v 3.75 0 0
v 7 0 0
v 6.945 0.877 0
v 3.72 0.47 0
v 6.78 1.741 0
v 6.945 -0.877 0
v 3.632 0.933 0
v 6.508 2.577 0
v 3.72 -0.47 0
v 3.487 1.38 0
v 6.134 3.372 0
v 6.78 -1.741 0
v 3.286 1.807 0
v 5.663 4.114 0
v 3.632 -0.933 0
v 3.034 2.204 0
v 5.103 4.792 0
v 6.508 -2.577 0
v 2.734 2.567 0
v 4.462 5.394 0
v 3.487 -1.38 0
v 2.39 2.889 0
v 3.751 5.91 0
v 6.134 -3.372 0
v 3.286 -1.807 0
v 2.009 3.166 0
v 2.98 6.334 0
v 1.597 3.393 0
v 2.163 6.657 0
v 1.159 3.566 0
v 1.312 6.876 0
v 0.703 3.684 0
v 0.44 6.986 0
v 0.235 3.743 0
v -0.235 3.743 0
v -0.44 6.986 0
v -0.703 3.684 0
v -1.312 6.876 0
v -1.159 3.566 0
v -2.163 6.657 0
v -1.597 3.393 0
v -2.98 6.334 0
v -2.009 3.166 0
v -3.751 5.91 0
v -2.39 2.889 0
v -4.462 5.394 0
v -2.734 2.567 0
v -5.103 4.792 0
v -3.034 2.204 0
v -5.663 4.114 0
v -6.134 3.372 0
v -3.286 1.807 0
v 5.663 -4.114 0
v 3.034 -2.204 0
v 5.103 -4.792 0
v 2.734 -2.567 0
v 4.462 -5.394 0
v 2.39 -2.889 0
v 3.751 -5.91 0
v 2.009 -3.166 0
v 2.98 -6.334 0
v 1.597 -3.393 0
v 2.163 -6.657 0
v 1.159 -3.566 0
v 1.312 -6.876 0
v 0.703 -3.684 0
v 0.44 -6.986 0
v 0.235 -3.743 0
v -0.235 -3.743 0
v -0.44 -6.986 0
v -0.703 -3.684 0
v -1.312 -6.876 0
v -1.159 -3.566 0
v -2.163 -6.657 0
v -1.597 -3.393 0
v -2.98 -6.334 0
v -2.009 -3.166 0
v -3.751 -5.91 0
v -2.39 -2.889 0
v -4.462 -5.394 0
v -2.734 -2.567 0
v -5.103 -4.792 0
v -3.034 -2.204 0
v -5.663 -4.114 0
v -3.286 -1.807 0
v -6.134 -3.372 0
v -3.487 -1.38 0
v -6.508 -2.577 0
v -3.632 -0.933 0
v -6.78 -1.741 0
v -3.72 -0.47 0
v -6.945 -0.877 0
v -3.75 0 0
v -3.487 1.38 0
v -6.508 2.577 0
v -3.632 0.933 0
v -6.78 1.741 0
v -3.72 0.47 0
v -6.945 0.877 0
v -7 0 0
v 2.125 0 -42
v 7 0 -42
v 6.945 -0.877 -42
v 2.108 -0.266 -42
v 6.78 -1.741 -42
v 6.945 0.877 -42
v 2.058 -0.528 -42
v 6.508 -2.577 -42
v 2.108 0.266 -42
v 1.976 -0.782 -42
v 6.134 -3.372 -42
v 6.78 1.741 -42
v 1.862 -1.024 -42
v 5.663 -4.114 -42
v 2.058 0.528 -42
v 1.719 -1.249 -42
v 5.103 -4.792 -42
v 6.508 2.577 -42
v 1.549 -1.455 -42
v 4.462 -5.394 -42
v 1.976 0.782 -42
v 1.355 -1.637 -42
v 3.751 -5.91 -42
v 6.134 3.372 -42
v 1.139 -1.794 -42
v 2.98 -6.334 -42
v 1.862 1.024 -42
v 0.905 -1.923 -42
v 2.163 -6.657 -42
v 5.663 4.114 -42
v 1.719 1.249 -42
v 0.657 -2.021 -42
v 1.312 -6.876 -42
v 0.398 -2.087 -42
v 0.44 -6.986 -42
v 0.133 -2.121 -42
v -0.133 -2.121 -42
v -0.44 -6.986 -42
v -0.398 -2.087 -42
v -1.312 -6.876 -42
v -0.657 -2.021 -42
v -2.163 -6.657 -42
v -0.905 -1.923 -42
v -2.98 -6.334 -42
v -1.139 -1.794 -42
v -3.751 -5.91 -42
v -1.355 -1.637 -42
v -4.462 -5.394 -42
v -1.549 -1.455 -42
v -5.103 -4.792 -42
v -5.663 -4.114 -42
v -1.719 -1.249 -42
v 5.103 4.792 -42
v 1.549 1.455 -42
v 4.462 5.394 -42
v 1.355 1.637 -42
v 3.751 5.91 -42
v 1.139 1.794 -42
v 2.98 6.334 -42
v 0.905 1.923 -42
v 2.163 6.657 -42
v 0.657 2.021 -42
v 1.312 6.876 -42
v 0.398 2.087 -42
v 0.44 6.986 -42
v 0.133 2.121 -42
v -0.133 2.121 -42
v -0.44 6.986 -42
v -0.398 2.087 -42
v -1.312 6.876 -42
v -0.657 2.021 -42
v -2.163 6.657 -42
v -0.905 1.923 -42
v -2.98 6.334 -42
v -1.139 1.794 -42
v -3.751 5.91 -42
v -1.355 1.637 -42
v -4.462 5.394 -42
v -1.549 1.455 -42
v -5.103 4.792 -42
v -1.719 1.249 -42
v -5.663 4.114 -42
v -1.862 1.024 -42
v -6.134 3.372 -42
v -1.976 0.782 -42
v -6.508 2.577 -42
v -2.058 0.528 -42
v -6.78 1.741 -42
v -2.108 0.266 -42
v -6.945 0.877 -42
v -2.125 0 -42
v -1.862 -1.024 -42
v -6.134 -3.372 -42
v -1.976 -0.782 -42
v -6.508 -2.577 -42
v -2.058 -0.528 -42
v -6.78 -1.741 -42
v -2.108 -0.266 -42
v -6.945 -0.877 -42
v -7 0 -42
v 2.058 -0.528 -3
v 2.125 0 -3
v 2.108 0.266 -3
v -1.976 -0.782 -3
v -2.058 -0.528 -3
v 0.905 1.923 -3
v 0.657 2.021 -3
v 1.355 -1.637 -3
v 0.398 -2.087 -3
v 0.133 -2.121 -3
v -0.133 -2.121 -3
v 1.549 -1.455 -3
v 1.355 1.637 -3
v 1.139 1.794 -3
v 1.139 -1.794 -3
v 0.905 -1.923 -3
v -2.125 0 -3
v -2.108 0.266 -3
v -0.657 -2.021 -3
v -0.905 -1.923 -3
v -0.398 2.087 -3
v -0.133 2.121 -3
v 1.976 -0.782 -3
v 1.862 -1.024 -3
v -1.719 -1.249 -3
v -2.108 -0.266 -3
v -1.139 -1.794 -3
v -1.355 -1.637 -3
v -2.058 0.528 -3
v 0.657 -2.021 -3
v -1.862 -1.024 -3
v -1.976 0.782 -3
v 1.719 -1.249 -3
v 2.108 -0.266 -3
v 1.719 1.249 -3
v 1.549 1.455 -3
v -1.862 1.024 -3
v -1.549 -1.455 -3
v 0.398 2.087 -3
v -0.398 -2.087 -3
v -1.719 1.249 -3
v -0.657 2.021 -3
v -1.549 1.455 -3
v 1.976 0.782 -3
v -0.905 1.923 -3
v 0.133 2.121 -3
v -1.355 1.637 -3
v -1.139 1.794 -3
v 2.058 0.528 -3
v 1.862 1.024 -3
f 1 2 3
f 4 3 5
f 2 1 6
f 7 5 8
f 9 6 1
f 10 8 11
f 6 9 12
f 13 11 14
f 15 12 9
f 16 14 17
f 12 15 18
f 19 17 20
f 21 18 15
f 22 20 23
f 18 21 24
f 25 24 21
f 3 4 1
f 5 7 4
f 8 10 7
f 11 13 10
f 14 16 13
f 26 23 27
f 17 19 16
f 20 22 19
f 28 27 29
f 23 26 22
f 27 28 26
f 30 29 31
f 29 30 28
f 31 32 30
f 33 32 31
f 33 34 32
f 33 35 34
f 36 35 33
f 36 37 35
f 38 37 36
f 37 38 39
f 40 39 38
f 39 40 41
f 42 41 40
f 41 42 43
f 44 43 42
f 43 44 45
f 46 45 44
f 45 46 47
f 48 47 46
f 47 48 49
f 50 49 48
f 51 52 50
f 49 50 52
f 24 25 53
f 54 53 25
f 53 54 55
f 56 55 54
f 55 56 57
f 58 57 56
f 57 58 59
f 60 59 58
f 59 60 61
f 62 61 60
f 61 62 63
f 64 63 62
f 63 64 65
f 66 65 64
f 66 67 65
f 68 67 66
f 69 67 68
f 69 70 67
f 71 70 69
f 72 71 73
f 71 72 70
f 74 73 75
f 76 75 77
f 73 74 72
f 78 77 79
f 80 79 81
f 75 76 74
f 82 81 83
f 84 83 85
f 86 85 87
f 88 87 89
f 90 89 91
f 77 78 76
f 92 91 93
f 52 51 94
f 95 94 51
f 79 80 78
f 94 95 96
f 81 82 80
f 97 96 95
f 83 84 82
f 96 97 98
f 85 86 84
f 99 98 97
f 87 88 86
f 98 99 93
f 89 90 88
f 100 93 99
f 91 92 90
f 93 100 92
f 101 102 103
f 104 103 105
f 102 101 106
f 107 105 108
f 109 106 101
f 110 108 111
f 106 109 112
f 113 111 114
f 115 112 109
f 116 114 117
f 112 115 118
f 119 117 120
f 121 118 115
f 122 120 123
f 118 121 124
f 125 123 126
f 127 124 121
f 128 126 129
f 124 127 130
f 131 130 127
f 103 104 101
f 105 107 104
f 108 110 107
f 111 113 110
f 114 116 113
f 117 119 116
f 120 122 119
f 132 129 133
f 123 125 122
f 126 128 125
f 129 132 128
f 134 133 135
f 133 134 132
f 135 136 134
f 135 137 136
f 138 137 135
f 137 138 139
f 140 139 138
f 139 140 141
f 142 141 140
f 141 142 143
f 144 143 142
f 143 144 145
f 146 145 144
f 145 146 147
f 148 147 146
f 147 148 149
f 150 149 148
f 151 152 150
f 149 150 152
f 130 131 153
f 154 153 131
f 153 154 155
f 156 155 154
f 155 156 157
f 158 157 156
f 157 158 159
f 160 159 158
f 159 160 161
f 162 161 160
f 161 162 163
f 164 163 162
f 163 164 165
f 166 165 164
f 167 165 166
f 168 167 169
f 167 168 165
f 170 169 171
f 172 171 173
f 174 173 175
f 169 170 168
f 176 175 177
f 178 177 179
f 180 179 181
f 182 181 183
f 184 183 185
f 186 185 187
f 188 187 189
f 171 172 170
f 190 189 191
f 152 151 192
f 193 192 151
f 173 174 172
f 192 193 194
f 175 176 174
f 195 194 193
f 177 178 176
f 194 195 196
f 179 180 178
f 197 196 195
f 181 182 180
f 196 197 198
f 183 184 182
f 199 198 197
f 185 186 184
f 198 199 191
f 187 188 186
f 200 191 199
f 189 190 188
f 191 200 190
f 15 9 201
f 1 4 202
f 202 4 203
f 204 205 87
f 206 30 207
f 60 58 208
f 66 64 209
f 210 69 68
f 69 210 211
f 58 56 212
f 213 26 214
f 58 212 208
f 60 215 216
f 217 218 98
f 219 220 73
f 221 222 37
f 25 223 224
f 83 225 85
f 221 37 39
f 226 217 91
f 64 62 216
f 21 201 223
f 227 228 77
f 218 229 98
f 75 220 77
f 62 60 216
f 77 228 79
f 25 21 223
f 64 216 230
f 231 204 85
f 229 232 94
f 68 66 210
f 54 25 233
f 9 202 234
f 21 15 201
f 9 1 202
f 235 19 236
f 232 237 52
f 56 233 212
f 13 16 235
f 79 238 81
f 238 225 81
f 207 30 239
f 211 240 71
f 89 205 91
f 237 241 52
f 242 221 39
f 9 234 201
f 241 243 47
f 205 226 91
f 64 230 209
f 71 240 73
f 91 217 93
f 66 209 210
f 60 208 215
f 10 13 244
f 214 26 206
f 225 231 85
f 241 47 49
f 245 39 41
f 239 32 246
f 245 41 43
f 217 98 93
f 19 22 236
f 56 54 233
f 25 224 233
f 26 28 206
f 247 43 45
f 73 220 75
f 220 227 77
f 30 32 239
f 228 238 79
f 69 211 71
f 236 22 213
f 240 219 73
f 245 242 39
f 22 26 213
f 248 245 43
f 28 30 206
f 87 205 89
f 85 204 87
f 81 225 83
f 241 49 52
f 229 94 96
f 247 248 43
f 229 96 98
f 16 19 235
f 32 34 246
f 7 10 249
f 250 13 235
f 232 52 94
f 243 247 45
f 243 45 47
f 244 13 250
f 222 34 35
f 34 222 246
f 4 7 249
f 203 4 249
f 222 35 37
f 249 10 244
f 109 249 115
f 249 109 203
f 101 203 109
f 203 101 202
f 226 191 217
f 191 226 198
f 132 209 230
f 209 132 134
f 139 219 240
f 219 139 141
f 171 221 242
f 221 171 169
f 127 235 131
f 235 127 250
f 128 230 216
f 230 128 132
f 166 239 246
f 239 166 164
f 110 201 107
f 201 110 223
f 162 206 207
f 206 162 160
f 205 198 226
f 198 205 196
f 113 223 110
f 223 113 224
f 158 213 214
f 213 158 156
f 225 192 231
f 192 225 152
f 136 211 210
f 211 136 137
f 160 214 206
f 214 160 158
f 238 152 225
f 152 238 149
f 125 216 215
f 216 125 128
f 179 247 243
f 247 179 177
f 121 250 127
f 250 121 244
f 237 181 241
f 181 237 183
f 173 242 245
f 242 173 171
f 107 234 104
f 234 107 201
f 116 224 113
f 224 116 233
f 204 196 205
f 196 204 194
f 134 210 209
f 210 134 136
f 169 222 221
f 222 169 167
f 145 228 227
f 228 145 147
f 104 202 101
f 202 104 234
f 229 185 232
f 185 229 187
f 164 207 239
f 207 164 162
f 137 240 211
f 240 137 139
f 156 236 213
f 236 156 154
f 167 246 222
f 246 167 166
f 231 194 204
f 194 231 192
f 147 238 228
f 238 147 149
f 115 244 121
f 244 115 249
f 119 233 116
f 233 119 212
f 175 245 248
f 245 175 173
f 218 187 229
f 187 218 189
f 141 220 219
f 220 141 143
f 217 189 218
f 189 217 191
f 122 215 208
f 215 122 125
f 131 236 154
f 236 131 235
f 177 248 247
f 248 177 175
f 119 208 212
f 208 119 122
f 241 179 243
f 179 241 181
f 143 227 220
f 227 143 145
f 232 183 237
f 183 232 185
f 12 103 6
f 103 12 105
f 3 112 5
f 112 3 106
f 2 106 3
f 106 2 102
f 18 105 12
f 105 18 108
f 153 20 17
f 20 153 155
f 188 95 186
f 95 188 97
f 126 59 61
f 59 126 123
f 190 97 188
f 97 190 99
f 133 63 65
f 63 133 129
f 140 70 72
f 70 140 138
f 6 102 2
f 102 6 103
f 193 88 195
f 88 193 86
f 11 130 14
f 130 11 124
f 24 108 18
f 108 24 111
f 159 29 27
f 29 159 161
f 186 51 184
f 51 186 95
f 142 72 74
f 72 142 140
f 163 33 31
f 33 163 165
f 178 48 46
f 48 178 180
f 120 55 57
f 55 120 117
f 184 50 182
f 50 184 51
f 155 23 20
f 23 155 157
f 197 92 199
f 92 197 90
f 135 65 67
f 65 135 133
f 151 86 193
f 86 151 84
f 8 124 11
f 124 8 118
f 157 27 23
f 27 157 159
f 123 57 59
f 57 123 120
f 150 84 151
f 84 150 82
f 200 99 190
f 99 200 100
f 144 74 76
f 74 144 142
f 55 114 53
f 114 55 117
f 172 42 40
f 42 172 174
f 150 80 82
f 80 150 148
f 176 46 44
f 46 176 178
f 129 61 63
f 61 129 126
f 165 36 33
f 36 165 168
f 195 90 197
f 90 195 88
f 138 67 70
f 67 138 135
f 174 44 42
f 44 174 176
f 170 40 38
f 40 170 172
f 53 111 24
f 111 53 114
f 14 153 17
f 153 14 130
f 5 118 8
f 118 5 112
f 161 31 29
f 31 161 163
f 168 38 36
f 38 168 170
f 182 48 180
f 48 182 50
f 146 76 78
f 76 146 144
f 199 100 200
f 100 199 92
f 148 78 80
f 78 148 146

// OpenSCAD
$fn = 50;


difference() {
	union() {
		translate(v = [0, 0, -42.0000000000]) {
			cylinder(h = 42, r = 7.0000000000);
		}
	}
	union() {
		translate(v = [0, 0, 0]) {
			rotate(a = [0, 0, 0]) {
				difference() {
					union() {
						#translate(v = [0, 0, -42.0000000000]) {
							cylinder(h = 42, r = 2.0000000000);
						}
						#translate(v = [0, 0, -3]) {
							cylinder(h = 3, r = 7.0000000000, r1 = 2.1250000000, r2 = 3.7500000000);
						}
						#translate(v = [0, 0, -42.0000000000]) {
							cylinder(h = 42, r = 2.1250000000);
						}
						#translate(v = [0, 0, -42.0000000000]) {
							cylinder(h = 42, r = 2.0000000000);
						}
					}
					union();
				}
			}
		}
	}
}
